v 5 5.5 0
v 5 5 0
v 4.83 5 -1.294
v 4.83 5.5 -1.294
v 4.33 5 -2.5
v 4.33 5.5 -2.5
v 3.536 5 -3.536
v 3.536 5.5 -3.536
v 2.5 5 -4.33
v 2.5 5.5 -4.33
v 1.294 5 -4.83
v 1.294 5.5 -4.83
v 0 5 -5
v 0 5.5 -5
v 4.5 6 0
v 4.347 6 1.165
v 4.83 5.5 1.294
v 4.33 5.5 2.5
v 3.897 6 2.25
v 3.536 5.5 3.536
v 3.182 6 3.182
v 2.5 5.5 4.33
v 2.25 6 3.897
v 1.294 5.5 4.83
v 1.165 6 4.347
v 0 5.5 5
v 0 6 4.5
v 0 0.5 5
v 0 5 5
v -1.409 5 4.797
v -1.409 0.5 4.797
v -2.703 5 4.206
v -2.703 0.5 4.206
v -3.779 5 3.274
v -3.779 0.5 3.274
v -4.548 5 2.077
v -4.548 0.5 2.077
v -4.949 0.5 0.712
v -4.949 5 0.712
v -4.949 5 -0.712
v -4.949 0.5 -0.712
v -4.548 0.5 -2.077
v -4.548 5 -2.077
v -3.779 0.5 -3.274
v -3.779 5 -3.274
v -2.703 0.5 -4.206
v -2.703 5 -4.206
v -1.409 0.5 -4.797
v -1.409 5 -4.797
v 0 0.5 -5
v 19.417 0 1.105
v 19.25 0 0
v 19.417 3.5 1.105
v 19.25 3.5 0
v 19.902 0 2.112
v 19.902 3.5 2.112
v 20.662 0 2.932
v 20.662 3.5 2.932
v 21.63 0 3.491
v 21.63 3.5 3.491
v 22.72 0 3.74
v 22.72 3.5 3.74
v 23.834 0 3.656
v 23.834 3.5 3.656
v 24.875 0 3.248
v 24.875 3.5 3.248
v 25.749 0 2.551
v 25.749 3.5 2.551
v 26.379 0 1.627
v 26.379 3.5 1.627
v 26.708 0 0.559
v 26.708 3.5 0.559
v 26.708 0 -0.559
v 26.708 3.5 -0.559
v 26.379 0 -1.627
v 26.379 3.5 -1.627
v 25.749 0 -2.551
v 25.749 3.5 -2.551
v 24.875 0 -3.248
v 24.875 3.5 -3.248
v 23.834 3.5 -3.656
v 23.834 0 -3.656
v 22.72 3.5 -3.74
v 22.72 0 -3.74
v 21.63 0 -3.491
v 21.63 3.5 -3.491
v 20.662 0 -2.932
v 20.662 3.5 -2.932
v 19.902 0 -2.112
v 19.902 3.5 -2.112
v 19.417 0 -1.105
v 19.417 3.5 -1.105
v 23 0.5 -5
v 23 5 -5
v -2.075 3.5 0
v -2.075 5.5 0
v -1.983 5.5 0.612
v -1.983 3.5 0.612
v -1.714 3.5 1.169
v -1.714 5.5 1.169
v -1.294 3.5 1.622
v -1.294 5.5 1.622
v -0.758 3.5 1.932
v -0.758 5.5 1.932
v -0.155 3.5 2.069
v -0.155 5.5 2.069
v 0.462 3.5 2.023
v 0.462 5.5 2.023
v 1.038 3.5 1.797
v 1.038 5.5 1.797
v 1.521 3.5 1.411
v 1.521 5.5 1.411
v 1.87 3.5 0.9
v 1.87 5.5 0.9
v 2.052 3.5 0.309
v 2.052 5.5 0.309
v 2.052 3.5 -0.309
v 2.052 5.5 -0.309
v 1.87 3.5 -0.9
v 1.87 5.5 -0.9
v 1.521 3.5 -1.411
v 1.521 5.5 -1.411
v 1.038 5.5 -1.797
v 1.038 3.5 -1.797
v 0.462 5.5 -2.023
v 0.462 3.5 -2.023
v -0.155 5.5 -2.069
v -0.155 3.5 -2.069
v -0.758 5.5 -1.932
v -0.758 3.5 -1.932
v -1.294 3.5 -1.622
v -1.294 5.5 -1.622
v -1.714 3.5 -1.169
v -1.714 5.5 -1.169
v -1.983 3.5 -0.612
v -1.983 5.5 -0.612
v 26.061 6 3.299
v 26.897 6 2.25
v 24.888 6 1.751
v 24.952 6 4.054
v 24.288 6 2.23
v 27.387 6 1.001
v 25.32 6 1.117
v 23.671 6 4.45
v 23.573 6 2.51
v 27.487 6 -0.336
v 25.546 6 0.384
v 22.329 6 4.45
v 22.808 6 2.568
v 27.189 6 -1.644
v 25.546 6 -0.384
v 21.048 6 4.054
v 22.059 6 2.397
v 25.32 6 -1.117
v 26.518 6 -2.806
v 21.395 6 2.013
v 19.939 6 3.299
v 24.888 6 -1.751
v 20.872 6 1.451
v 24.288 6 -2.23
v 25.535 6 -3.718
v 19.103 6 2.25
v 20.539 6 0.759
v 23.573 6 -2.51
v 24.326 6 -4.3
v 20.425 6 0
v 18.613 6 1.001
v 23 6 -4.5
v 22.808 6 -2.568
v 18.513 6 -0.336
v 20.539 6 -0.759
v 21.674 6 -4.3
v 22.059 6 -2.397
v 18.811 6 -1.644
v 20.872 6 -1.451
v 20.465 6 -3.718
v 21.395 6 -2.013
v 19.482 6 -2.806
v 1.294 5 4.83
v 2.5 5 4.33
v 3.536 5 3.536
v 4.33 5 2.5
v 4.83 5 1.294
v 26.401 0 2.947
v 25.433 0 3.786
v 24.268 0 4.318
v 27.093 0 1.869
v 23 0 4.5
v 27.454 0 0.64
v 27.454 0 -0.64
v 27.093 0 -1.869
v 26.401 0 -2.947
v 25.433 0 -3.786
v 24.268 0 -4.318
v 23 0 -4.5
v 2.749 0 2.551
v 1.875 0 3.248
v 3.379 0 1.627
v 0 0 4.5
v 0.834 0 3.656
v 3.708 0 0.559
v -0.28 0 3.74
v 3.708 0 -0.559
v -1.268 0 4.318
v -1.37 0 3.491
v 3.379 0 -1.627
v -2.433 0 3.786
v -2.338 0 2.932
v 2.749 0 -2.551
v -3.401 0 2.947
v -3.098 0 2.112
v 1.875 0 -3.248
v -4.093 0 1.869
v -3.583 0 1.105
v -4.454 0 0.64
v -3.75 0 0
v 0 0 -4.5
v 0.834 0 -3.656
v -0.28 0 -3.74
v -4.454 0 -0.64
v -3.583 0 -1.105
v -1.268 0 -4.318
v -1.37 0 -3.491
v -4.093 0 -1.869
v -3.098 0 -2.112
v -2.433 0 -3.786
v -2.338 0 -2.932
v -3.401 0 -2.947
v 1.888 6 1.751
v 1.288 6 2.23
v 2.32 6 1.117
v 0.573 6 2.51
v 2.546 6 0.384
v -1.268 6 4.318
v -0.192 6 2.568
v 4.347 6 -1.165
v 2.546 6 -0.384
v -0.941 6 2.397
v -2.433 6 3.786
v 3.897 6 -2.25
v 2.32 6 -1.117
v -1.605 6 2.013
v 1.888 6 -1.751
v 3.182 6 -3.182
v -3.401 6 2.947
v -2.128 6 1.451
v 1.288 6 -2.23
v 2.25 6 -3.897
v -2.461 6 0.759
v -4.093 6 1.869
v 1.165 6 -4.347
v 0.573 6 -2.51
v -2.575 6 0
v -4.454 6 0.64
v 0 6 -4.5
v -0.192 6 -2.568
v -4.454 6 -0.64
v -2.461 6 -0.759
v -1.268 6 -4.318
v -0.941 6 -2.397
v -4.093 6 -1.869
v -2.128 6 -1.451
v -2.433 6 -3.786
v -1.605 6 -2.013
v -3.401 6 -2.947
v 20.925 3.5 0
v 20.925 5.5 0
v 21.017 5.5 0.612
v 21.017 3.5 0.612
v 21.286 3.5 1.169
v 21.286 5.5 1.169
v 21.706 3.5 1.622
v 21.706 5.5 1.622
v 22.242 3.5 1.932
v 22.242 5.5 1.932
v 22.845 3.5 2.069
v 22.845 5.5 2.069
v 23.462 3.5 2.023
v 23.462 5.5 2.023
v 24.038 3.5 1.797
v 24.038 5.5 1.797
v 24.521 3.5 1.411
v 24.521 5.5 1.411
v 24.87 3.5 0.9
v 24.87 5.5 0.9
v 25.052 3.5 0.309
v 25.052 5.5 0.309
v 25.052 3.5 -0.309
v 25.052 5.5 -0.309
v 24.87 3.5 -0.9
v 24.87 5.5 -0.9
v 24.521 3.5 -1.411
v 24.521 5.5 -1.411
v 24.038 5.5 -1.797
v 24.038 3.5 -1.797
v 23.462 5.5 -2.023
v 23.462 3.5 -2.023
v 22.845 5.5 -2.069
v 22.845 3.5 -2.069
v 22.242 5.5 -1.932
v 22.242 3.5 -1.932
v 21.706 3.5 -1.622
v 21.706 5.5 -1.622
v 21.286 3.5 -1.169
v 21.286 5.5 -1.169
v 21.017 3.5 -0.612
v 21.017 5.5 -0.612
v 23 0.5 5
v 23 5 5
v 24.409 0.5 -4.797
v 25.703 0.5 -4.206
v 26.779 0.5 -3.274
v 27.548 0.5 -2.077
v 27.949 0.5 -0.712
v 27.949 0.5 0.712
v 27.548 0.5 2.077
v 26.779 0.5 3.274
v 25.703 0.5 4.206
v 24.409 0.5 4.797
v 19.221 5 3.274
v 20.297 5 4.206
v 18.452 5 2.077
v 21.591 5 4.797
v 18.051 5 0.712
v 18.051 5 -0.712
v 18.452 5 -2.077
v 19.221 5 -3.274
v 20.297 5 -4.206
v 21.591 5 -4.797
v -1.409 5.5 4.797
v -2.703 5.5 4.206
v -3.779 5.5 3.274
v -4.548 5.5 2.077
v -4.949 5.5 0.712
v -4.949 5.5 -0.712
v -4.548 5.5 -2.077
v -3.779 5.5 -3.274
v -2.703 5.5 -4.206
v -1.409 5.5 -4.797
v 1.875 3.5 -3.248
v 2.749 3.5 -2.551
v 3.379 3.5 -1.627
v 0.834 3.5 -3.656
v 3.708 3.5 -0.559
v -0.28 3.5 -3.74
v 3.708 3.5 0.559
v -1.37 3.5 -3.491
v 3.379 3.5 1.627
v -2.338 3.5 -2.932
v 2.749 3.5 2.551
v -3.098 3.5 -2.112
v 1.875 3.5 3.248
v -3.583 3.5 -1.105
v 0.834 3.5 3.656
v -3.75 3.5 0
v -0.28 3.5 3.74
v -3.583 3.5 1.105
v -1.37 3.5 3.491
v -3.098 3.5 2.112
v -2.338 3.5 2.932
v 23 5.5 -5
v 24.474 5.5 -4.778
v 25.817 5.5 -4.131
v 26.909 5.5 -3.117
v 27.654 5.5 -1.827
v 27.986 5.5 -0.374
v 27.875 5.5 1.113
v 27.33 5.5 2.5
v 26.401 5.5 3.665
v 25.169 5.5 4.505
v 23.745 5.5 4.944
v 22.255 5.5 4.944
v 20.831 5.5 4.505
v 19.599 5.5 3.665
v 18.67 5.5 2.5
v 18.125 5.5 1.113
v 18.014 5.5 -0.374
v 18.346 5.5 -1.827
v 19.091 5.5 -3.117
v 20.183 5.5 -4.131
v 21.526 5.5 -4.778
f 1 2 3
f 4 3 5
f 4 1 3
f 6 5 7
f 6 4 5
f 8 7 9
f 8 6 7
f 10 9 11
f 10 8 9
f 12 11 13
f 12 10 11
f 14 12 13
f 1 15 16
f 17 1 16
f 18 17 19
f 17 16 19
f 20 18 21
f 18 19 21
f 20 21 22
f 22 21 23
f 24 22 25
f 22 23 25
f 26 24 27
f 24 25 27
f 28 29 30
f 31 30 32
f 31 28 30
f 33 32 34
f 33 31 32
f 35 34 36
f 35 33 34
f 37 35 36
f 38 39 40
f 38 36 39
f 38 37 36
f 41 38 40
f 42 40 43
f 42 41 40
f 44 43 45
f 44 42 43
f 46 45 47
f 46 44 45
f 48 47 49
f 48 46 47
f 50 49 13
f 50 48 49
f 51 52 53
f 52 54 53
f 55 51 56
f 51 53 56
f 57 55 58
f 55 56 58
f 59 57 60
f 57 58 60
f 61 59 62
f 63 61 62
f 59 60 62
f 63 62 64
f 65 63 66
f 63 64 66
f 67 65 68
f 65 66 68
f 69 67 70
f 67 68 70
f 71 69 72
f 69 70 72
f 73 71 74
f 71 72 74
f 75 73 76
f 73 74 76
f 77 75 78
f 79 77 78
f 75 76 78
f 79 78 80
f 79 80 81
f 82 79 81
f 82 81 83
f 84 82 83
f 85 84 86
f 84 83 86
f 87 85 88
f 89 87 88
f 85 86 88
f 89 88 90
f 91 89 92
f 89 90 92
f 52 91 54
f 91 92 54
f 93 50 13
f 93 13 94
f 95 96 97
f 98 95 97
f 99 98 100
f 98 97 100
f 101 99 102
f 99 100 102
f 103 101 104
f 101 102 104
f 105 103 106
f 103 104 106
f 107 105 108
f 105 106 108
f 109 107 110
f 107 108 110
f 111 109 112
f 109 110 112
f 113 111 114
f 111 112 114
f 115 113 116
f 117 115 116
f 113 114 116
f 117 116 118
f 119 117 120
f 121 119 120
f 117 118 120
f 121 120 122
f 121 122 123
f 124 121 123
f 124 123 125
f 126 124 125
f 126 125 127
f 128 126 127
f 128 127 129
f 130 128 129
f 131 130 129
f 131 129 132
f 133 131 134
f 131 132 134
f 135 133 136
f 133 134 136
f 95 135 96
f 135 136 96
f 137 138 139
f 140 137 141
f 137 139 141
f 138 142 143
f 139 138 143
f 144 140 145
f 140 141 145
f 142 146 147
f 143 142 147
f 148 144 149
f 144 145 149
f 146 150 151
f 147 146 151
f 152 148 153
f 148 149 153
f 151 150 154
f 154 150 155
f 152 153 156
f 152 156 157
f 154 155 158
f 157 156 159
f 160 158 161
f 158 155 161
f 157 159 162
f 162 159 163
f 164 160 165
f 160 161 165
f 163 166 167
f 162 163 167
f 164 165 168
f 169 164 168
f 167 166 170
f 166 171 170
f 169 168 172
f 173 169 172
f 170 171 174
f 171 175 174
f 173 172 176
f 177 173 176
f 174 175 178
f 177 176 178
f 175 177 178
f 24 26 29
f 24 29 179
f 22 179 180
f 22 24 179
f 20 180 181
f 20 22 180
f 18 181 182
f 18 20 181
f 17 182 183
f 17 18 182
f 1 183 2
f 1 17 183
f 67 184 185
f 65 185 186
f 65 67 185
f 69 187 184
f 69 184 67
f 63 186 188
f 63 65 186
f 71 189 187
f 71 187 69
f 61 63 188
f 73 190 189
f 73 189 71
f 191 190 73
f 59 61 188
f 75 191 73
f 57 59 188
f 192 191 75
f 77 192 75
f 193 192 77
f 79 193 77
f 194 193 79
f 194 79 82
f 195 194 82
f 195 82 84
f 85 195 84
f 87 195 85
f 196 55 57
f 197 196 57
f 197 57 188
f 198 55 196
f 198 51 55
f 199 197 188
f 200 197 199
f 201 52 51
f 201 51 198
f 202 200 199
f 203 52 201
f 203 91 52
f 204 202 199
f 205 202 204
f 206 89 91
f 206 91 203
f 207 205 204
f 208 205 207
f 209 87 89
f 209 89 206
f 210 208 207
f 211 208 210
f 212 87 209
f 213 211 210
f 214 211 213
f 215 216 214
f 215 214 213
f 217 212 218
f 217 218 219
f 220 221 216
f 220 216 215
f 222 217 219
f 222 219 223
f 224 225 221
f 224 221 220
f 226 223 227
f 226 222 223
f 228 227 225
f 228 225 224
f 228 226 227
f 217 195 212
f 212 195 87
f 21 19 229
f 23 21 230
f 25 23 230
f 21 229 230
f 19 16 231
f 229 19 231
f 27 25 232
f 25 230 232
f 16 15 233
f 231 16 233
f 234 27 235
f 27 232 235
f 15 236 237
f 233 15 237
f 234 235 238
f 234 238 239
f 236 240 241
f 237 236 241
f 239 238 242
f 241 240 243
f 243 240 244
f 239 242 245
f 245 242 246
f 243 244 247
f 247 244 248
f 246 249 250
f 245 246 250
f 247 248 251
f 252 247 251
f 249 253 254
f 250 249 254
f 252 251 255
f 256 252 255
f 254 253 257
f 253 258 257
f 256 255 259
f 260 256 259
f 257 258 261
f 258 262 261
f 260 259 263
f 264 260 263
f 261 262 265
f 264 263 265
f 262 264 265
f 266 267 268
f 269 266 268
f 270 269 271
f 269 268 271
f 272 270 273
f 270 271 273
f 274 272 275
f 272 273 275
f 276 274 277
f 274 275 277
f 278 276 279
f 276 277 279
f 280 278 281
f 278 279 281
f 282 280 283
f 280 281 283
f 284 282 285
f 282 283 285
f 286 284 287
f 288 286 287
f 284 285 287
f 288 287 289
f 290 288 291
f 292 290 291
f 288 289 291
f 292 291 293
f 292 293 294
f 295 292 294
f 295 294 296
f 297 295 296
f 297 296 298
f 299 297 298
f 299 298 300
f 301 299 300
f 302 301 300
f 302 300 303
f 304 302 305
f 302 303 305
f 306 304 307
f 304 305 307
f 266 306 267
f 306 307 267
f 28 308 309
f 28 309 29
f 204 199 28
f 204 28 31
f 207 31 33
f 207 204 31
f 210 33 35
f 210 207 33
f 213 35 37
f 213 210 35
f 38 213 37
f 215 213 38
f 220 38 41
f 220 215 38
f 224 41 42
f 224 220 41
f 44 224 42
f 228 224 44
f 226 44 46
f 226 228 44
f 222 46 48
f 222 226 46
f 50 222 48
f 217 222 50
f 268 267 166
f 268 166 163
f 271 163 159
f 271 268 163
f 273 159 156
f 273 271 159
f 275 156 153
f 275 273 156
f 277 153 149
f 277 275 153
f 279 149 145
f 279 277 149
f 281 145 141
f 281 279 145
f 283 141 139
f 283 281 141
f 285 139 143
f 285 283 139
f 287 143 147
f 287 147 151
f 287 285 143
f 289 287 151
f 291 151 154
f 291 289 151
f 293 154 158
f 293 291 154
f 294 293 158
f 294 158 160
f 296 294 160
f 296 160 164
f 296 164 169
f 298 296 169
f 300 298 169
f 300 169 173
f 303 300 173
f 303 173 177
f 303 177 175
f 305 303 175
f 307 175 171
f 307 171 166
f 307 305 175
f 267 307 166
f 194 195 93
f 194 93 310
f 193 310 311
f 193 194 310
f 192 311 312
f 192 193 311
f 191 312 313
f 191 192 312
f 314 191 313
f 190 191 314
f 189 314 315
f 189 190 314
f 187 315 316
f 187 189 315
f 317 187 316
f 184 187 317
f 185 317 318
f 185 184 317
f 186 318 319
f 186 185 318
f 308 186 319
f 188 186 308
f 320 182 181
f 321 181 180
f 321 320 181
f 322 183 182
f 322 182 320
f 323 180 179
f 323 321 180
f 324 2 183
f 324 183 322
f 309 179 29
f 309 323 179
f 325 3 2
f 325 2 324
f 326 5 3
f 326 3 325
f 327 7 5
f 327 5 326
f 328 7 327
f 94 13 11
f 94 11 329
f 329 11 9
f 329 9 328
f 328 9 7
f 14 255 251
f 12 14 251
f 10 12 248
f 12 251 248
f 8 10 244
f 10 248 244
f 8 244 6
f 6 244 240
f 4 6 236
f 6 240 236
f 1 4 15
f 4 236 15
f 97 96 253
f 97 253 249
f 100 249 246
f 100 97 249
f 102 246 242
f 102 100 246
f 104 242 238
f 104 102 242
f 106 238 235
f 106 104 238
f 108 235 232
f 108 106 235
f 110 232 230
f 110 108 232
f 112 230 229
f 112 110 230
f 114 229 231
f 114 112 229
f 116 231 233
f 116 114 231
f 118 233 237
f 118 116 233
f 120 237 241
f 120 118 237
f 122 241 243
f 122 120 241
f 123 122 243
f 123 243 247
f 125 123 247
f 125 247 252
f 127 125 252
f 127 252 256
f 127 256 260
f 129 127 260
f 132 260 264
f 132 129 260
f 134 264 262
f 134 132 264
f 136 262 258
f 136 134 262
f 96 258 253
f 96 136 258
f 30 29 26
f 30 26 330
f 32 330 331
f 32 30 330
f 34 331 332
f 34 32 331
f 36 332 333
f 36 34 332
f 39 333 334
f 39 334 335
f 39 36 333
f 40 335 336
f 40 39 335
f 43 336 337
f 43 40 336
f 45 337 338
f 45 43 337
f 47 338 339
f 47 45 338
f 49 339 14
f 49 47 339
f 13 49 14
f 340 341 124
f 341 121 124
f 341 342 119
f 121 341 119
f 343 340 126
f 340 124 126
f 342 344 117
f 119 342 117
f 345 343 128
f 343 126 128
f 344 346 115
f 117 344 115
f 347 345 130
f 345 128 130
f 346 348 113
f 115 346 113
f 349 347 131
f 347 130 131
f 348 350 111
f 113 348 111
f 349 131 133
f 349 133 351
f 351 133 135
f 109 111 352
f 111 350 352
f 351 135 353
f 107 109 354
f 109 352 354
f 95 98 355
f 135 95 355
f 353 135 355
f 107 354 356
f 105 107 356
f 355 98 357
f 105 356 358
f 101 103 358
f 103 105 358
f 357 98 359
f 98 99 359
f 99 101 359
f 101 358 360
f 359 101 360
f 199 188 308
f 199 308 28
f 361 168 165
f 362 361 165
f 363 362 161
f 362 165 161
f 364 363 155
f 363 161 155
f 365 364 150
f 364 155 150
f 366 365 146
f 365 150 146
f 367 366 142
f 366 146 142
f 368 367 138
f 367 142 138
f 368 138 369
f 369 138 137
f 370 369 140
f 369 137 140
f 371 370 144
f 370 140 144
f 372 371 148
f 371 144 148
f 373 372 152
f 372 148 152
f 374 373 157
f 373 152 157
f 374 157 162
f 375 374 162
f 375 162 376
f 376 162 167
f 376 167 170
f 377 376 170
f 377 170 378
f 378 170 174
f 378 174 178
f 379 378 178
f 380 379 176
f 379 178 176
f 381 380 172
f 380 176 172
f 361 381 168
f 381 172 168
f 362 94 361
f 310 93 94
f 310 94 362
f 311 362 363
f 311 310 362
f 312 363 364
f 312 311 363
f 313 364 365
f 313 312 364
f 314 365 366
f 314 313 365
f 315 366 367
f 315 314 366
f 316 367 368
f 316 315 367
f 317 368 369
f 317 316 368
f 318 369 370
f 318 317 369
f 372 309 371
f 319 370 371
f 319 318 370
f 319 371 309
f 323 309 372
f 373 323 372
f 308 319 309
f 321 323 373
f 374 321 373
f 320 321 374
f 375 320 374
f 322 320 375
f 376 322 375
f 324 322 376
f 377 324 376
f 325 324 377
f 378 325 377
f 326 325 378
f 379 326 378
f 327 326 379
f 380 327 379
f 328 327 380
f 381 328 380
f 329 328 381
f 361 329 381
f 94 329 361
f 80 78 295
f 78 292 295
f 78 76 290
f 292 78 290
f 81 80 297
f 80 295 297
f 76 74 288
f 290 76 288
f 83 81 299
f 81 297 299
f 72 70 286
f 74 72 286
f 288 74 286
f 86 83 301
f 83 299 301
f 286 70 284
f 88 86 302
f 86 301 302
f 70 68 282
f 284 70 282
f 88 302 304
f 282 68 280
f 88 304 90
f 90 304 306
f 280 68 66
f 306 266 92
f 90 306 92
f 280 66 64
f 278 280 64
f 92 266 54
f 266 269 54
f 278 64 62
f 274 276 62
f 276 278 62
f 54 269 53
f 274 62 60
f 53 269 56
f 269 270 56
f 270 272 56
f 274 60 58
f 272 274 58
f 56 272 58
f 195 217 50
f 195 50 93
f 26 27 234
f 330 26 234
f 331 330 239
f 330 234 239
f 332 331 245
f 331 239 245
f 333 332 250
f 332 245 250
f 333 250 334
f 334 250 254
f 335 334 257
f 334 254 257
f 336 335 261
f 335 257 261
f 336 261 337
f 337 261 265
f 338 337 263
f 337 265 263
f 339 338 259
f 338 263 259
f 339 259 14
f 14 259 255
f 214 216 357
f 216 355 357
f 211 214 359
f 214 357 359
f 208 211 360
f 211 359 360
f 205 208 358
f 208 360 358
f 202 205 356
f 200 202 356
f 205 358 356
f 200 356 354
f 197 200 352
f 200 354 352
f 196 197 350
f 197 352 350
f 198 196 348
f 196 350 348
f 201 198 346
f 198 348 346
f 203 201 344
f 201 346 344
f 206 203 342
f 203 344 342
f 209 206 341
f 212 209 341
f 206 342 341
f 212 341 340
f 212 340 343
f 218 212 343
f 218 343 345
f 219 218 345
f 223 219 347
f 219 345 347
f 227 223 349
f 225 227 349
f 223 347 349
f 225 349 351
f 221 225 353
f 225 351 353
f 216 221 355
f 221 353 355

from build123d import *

# Parameters (mm, degrees)
BOSS_EXTRUDE1_DEPTH = 6
SKETCH5_W           = 50.780974492
SKETCH5_H           = 22.085020173
SKETCH5_R           = 5
CUT_EXTRUDE1_DEPTH  = 1
CHAMFER2_SIZE       = 0.5


with BuildPart() as part:
    # Sketch2 → Boss-Extrude1 (new body)
    with BuildSketch(Plane(origin=(0, 0, 0), x_dir=(1, 0, 0), z_dir=(0, 1, 0))):
        with BuildLine():
            Line((0, 5), (23, 5))
            ThreePointArc((23, 5), (28, 0), (23, -5))
            Line((23, -5), (0, -5))
            ThreePointArc((0, -5), (-5, 0), (0, 5))
        make_face()
    extrude(amount=BOSS_EXTRUDE1_DEPTH)

    # Sketch3 → Cut-Revolve1 (revolve, cut)
    with BuildSketch(Plane.XY):
        Polygon((0, 0), (-3.75, 0), (-3.75, 3.5), (-2.075, 3.5), (-2.075, 6), (0, 6), align=None)
    revolve(axis=Axis((0, 0, 0), (0, 1, 0)), mode=Mode.SUBTRACT)

    # Sketch4 → Cut-Revolve2 (revolve, cut)
    with BuildSketch(Plane.XY):
        Polygon((23, 0), (19.25, 0), (19.25, 3.5), (20.925, 3.5), (20.925, 6), (23, 6), align=None)
    revolve(axis=Axis((23, 0, 0), (0, 1, 0)), mode=Mode.SUBTRACT)

    # Sketch5 → Cut-Extrude1 (cut)
    with BuildSketch(Plane(origin=(0, 6, 0), x_dir=(1, 0, 0), z_dir=(0, 1, 0))):
        with Locations((10.314830551, 0.079491573)):
            Rectangle(SKETCH5_W, SKETCH5_H)
        Circle(SKETCH5_R, mode=Mode.SUBTRACT)
        with Locations((23, 0)):
            Circle(SKETCH5_R, mode=Mode.SUBTRACT)
    extrude(amount=-CUT_EXTRUDE1_DEPTH, mode=Mode.SUBTRACT)

    # Chamfer2
    chamfer2_edges = [part.edges().sort_by_distance(p)[0] for p in [
        (23, 6, 5),
        (2.075, 6, 0),
        (25.075, 6, 0),
        (-5, 6, 0),
        (11.5, 0, -5),
        (28, 0, 0),
        (11.5, 0, 5),
        (-5, 0, 0),
    ]]
    chamfer(chamfer2_edges, length=CHAMFER2_SIZE)


solid = part.part
